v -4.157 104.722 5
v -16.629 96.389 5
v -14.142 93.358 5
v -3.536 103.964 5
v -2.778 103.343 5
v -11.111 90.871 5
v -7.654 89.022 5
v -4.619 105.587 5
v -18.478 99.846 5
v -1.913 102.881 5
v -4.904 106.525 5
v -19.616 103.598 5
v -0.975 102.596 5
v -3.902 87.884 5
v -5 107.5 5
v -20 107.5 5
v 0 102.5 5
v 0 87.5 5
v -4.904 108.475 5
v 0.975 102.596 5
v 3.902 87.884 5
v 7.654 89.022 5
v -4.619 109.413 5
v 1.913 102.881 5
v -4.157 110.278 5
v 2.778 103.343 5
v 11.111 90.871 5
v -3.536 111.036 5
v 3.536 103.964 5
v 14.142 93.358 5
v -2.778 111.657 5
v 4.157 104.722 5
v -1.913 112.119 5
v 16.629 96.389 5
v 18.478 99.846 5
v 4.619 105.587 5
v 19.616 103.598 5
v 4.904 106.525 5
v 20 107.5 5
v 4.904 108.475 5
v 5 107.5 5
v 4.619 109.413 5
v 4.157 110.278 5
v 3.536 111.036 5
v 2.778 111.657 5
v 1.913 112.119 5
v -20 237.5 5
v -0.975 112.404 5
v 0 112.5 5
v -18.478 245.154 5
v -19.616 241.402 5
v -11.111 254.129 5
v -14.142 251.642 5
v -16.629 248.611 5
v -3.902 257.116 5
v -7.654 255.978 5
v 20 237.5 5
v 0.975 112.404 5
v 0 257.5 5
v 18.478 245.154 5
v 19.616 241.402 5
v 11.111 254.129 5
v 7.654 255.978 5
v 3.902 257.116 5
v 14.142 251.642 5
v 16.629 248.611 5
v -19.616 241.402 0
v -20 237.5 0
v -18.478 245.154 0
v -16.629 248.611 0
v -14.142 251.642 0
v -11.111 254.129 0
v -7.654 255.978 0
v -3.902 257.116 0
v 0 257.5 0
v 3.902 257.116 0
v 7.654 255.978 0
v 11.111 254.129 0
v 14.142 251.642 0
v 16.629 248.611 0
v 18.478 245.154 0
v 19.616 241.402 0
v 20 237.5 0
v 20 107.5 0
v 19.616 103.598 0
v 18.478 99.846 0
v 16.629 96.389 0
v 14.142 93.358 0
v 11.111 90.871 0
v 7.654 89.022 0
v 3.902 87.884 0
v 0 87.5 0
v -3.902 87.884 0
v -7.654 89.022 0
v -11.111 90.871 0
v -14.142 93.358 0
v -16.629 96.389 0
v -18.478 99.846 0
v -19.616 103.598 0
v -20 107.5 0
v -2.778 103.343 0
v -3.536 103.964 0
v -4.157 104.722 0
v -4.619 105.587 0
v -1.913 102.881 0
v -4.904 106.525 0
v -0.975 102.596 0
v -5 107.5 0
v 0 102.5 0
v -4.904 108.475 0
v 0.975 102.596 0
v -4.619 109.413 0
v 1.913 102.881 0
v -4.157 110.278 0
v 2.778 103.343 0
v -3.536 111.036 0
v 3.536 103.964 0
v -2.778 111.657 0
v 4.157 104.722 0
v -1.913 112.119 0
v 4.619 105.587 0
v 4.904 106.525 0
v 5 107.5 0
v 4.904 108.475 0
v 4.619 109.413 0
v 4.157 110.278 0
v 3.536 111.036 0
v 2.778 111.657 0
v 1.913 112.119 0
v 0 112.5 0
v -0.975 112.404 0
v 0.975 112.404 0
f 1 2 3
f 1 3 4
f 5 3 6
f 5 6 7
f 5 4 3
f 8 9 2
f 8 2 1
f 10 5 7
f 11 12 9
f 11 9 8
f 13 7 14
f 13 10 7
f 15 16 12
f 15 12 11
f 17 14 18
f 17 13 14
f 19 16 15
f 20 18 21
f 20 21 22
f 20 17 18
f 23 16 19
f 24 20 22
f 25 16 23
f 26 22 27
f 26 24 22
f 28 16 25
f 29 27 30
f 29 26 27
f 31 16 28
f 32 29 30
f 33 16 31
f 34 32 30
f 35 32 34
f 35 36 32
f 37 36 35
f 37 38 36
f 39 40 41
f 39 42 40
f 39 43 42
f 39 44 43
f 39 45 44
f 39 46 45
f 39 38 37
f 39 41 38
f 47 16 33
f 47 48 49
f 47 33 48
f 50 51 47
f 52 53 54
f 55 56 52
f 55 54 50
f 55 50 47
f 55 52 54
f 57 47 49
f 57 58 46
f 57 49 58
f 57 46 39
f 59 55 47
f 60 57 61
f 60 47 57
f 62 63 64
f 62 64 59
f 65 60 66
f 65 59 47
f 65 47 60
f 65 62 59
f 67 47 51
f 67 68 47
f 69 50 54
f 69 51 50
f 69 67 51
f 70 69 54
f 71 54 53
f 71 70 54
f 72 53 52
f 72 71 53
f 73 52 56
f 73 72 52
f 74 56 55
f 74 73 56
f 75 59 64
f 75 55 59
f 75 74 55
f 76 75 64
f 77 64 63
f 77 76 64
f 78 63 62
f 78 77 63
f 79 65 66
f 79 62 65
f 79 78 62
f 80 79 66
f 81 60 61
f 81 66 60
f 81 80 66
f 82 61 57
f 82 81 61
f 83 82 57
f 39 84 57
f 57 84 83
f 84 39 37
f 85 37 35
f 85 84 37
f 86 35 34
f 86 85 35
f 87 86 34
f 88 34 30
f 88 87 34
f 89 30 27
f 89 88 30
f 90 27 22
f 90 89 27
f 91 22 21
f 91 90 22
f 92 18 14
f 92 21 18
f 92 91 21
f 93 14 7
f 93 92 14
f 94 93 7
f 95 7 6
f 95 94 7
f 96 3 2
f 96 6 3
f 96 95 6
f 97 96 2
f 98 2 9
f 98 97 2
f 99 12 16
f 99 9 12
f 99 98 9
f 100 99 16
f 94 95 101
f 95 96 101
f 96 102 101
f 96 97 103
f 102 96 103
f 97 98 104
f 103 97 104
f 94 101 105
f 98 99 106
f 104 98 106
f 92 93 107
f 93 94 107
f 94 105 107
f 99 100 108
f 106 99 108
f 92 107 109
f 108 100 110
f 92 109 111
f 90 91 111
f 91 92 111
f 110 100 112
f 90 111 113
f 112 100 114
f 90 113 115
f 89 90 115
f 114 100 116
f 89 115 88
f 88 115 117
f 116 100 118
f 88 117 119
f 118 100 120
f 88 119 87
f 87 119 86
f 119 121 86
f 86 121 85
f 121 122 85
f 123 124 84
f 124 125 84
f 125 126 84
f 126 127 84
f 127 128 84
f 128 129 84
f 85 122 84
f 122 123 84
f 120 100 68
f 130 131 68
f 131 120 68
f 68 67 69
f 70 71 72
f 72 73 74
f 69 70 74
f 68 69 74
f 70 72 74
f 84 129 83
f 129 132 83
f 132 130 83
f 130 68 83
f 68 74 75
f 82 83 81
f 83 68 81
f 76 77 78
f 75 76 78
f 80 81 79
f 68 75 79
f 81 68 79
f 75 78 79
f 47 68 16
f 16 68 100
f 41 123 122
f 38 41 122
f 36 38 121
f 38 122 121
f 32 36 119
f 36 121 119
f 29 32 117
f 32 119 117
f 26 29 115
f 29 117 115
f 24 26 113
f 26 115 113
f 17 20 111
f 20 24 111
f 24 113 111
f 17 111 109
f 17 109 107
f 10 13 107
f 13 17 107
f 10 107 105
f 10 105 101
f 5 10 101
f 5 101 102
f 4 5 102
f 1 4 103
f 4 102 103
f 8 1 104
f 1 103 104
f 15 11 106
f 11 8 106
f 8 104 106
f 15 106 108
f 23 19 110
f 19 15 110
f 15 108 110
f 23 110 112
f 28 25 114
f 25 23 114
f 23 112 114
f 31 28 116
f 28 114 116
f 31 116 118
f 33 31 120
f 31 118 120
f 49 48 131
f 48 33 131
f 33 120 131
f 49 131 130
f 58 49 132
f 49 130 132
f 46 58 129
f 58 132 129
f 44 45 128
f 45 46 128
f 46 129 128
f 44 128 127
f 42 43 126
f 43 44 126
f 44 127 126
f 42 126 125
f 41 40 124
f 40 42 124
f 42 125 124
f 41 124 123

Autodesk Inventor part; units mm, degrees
ref_plane "YZ Plane" through (0, 0, 0) normal (1, 0, 0) x (0, 1, 0)
ref_plane "XZ Plane" through (0, 0, 0) normal (0, 1, 0) x (-1, 0, 0)
ref_plane "XY Plane" through (0, 0, 0) normal (0, 0, 1) x (1, 0, 0)
ref_plane "Work Plane1" through (0, 0, 0) normal (0, 0, 1) x (1, 0, 0)
sketch "Sketch1" plane through (0, 0, 0) normal (0, 0, 1) x (1, 0, 0)
  circle A0 centre (0, 107.5) radius 10 projected
  circle A1 centre (0, 107.5) radius 5 projected
  line L0 (20, 237.5) -> (-20, 237.5)
  line L1 (-20, 237.5) -> (-20, 87.5)
  line L2 (-20, 87.5) -> (20, 87.5)
  line L3 (20, 87.5) -> (20, 237.5)
  circle A2 centre (0, 107.5) radius 20
  circle A3 centre (0, 237.5) radius 20
  point P0 (0, 0)
  point P1 (-20, 107.5)
  point P2 (20, 107.5)
  dimension "d0" = 40
  dimension "d1" = 150
  dimension "d2" = 20
  dimension "d4" = 20
  dimension "d5" = 40
  dimension "d6" = 130
extrude "Extrusion1" add sketch "Sketch1" along normal blind 5 contours A0 | A3 L0 | L0 A3 | L3 A2 L1 A3 | A2
properties part number "Link3base"
